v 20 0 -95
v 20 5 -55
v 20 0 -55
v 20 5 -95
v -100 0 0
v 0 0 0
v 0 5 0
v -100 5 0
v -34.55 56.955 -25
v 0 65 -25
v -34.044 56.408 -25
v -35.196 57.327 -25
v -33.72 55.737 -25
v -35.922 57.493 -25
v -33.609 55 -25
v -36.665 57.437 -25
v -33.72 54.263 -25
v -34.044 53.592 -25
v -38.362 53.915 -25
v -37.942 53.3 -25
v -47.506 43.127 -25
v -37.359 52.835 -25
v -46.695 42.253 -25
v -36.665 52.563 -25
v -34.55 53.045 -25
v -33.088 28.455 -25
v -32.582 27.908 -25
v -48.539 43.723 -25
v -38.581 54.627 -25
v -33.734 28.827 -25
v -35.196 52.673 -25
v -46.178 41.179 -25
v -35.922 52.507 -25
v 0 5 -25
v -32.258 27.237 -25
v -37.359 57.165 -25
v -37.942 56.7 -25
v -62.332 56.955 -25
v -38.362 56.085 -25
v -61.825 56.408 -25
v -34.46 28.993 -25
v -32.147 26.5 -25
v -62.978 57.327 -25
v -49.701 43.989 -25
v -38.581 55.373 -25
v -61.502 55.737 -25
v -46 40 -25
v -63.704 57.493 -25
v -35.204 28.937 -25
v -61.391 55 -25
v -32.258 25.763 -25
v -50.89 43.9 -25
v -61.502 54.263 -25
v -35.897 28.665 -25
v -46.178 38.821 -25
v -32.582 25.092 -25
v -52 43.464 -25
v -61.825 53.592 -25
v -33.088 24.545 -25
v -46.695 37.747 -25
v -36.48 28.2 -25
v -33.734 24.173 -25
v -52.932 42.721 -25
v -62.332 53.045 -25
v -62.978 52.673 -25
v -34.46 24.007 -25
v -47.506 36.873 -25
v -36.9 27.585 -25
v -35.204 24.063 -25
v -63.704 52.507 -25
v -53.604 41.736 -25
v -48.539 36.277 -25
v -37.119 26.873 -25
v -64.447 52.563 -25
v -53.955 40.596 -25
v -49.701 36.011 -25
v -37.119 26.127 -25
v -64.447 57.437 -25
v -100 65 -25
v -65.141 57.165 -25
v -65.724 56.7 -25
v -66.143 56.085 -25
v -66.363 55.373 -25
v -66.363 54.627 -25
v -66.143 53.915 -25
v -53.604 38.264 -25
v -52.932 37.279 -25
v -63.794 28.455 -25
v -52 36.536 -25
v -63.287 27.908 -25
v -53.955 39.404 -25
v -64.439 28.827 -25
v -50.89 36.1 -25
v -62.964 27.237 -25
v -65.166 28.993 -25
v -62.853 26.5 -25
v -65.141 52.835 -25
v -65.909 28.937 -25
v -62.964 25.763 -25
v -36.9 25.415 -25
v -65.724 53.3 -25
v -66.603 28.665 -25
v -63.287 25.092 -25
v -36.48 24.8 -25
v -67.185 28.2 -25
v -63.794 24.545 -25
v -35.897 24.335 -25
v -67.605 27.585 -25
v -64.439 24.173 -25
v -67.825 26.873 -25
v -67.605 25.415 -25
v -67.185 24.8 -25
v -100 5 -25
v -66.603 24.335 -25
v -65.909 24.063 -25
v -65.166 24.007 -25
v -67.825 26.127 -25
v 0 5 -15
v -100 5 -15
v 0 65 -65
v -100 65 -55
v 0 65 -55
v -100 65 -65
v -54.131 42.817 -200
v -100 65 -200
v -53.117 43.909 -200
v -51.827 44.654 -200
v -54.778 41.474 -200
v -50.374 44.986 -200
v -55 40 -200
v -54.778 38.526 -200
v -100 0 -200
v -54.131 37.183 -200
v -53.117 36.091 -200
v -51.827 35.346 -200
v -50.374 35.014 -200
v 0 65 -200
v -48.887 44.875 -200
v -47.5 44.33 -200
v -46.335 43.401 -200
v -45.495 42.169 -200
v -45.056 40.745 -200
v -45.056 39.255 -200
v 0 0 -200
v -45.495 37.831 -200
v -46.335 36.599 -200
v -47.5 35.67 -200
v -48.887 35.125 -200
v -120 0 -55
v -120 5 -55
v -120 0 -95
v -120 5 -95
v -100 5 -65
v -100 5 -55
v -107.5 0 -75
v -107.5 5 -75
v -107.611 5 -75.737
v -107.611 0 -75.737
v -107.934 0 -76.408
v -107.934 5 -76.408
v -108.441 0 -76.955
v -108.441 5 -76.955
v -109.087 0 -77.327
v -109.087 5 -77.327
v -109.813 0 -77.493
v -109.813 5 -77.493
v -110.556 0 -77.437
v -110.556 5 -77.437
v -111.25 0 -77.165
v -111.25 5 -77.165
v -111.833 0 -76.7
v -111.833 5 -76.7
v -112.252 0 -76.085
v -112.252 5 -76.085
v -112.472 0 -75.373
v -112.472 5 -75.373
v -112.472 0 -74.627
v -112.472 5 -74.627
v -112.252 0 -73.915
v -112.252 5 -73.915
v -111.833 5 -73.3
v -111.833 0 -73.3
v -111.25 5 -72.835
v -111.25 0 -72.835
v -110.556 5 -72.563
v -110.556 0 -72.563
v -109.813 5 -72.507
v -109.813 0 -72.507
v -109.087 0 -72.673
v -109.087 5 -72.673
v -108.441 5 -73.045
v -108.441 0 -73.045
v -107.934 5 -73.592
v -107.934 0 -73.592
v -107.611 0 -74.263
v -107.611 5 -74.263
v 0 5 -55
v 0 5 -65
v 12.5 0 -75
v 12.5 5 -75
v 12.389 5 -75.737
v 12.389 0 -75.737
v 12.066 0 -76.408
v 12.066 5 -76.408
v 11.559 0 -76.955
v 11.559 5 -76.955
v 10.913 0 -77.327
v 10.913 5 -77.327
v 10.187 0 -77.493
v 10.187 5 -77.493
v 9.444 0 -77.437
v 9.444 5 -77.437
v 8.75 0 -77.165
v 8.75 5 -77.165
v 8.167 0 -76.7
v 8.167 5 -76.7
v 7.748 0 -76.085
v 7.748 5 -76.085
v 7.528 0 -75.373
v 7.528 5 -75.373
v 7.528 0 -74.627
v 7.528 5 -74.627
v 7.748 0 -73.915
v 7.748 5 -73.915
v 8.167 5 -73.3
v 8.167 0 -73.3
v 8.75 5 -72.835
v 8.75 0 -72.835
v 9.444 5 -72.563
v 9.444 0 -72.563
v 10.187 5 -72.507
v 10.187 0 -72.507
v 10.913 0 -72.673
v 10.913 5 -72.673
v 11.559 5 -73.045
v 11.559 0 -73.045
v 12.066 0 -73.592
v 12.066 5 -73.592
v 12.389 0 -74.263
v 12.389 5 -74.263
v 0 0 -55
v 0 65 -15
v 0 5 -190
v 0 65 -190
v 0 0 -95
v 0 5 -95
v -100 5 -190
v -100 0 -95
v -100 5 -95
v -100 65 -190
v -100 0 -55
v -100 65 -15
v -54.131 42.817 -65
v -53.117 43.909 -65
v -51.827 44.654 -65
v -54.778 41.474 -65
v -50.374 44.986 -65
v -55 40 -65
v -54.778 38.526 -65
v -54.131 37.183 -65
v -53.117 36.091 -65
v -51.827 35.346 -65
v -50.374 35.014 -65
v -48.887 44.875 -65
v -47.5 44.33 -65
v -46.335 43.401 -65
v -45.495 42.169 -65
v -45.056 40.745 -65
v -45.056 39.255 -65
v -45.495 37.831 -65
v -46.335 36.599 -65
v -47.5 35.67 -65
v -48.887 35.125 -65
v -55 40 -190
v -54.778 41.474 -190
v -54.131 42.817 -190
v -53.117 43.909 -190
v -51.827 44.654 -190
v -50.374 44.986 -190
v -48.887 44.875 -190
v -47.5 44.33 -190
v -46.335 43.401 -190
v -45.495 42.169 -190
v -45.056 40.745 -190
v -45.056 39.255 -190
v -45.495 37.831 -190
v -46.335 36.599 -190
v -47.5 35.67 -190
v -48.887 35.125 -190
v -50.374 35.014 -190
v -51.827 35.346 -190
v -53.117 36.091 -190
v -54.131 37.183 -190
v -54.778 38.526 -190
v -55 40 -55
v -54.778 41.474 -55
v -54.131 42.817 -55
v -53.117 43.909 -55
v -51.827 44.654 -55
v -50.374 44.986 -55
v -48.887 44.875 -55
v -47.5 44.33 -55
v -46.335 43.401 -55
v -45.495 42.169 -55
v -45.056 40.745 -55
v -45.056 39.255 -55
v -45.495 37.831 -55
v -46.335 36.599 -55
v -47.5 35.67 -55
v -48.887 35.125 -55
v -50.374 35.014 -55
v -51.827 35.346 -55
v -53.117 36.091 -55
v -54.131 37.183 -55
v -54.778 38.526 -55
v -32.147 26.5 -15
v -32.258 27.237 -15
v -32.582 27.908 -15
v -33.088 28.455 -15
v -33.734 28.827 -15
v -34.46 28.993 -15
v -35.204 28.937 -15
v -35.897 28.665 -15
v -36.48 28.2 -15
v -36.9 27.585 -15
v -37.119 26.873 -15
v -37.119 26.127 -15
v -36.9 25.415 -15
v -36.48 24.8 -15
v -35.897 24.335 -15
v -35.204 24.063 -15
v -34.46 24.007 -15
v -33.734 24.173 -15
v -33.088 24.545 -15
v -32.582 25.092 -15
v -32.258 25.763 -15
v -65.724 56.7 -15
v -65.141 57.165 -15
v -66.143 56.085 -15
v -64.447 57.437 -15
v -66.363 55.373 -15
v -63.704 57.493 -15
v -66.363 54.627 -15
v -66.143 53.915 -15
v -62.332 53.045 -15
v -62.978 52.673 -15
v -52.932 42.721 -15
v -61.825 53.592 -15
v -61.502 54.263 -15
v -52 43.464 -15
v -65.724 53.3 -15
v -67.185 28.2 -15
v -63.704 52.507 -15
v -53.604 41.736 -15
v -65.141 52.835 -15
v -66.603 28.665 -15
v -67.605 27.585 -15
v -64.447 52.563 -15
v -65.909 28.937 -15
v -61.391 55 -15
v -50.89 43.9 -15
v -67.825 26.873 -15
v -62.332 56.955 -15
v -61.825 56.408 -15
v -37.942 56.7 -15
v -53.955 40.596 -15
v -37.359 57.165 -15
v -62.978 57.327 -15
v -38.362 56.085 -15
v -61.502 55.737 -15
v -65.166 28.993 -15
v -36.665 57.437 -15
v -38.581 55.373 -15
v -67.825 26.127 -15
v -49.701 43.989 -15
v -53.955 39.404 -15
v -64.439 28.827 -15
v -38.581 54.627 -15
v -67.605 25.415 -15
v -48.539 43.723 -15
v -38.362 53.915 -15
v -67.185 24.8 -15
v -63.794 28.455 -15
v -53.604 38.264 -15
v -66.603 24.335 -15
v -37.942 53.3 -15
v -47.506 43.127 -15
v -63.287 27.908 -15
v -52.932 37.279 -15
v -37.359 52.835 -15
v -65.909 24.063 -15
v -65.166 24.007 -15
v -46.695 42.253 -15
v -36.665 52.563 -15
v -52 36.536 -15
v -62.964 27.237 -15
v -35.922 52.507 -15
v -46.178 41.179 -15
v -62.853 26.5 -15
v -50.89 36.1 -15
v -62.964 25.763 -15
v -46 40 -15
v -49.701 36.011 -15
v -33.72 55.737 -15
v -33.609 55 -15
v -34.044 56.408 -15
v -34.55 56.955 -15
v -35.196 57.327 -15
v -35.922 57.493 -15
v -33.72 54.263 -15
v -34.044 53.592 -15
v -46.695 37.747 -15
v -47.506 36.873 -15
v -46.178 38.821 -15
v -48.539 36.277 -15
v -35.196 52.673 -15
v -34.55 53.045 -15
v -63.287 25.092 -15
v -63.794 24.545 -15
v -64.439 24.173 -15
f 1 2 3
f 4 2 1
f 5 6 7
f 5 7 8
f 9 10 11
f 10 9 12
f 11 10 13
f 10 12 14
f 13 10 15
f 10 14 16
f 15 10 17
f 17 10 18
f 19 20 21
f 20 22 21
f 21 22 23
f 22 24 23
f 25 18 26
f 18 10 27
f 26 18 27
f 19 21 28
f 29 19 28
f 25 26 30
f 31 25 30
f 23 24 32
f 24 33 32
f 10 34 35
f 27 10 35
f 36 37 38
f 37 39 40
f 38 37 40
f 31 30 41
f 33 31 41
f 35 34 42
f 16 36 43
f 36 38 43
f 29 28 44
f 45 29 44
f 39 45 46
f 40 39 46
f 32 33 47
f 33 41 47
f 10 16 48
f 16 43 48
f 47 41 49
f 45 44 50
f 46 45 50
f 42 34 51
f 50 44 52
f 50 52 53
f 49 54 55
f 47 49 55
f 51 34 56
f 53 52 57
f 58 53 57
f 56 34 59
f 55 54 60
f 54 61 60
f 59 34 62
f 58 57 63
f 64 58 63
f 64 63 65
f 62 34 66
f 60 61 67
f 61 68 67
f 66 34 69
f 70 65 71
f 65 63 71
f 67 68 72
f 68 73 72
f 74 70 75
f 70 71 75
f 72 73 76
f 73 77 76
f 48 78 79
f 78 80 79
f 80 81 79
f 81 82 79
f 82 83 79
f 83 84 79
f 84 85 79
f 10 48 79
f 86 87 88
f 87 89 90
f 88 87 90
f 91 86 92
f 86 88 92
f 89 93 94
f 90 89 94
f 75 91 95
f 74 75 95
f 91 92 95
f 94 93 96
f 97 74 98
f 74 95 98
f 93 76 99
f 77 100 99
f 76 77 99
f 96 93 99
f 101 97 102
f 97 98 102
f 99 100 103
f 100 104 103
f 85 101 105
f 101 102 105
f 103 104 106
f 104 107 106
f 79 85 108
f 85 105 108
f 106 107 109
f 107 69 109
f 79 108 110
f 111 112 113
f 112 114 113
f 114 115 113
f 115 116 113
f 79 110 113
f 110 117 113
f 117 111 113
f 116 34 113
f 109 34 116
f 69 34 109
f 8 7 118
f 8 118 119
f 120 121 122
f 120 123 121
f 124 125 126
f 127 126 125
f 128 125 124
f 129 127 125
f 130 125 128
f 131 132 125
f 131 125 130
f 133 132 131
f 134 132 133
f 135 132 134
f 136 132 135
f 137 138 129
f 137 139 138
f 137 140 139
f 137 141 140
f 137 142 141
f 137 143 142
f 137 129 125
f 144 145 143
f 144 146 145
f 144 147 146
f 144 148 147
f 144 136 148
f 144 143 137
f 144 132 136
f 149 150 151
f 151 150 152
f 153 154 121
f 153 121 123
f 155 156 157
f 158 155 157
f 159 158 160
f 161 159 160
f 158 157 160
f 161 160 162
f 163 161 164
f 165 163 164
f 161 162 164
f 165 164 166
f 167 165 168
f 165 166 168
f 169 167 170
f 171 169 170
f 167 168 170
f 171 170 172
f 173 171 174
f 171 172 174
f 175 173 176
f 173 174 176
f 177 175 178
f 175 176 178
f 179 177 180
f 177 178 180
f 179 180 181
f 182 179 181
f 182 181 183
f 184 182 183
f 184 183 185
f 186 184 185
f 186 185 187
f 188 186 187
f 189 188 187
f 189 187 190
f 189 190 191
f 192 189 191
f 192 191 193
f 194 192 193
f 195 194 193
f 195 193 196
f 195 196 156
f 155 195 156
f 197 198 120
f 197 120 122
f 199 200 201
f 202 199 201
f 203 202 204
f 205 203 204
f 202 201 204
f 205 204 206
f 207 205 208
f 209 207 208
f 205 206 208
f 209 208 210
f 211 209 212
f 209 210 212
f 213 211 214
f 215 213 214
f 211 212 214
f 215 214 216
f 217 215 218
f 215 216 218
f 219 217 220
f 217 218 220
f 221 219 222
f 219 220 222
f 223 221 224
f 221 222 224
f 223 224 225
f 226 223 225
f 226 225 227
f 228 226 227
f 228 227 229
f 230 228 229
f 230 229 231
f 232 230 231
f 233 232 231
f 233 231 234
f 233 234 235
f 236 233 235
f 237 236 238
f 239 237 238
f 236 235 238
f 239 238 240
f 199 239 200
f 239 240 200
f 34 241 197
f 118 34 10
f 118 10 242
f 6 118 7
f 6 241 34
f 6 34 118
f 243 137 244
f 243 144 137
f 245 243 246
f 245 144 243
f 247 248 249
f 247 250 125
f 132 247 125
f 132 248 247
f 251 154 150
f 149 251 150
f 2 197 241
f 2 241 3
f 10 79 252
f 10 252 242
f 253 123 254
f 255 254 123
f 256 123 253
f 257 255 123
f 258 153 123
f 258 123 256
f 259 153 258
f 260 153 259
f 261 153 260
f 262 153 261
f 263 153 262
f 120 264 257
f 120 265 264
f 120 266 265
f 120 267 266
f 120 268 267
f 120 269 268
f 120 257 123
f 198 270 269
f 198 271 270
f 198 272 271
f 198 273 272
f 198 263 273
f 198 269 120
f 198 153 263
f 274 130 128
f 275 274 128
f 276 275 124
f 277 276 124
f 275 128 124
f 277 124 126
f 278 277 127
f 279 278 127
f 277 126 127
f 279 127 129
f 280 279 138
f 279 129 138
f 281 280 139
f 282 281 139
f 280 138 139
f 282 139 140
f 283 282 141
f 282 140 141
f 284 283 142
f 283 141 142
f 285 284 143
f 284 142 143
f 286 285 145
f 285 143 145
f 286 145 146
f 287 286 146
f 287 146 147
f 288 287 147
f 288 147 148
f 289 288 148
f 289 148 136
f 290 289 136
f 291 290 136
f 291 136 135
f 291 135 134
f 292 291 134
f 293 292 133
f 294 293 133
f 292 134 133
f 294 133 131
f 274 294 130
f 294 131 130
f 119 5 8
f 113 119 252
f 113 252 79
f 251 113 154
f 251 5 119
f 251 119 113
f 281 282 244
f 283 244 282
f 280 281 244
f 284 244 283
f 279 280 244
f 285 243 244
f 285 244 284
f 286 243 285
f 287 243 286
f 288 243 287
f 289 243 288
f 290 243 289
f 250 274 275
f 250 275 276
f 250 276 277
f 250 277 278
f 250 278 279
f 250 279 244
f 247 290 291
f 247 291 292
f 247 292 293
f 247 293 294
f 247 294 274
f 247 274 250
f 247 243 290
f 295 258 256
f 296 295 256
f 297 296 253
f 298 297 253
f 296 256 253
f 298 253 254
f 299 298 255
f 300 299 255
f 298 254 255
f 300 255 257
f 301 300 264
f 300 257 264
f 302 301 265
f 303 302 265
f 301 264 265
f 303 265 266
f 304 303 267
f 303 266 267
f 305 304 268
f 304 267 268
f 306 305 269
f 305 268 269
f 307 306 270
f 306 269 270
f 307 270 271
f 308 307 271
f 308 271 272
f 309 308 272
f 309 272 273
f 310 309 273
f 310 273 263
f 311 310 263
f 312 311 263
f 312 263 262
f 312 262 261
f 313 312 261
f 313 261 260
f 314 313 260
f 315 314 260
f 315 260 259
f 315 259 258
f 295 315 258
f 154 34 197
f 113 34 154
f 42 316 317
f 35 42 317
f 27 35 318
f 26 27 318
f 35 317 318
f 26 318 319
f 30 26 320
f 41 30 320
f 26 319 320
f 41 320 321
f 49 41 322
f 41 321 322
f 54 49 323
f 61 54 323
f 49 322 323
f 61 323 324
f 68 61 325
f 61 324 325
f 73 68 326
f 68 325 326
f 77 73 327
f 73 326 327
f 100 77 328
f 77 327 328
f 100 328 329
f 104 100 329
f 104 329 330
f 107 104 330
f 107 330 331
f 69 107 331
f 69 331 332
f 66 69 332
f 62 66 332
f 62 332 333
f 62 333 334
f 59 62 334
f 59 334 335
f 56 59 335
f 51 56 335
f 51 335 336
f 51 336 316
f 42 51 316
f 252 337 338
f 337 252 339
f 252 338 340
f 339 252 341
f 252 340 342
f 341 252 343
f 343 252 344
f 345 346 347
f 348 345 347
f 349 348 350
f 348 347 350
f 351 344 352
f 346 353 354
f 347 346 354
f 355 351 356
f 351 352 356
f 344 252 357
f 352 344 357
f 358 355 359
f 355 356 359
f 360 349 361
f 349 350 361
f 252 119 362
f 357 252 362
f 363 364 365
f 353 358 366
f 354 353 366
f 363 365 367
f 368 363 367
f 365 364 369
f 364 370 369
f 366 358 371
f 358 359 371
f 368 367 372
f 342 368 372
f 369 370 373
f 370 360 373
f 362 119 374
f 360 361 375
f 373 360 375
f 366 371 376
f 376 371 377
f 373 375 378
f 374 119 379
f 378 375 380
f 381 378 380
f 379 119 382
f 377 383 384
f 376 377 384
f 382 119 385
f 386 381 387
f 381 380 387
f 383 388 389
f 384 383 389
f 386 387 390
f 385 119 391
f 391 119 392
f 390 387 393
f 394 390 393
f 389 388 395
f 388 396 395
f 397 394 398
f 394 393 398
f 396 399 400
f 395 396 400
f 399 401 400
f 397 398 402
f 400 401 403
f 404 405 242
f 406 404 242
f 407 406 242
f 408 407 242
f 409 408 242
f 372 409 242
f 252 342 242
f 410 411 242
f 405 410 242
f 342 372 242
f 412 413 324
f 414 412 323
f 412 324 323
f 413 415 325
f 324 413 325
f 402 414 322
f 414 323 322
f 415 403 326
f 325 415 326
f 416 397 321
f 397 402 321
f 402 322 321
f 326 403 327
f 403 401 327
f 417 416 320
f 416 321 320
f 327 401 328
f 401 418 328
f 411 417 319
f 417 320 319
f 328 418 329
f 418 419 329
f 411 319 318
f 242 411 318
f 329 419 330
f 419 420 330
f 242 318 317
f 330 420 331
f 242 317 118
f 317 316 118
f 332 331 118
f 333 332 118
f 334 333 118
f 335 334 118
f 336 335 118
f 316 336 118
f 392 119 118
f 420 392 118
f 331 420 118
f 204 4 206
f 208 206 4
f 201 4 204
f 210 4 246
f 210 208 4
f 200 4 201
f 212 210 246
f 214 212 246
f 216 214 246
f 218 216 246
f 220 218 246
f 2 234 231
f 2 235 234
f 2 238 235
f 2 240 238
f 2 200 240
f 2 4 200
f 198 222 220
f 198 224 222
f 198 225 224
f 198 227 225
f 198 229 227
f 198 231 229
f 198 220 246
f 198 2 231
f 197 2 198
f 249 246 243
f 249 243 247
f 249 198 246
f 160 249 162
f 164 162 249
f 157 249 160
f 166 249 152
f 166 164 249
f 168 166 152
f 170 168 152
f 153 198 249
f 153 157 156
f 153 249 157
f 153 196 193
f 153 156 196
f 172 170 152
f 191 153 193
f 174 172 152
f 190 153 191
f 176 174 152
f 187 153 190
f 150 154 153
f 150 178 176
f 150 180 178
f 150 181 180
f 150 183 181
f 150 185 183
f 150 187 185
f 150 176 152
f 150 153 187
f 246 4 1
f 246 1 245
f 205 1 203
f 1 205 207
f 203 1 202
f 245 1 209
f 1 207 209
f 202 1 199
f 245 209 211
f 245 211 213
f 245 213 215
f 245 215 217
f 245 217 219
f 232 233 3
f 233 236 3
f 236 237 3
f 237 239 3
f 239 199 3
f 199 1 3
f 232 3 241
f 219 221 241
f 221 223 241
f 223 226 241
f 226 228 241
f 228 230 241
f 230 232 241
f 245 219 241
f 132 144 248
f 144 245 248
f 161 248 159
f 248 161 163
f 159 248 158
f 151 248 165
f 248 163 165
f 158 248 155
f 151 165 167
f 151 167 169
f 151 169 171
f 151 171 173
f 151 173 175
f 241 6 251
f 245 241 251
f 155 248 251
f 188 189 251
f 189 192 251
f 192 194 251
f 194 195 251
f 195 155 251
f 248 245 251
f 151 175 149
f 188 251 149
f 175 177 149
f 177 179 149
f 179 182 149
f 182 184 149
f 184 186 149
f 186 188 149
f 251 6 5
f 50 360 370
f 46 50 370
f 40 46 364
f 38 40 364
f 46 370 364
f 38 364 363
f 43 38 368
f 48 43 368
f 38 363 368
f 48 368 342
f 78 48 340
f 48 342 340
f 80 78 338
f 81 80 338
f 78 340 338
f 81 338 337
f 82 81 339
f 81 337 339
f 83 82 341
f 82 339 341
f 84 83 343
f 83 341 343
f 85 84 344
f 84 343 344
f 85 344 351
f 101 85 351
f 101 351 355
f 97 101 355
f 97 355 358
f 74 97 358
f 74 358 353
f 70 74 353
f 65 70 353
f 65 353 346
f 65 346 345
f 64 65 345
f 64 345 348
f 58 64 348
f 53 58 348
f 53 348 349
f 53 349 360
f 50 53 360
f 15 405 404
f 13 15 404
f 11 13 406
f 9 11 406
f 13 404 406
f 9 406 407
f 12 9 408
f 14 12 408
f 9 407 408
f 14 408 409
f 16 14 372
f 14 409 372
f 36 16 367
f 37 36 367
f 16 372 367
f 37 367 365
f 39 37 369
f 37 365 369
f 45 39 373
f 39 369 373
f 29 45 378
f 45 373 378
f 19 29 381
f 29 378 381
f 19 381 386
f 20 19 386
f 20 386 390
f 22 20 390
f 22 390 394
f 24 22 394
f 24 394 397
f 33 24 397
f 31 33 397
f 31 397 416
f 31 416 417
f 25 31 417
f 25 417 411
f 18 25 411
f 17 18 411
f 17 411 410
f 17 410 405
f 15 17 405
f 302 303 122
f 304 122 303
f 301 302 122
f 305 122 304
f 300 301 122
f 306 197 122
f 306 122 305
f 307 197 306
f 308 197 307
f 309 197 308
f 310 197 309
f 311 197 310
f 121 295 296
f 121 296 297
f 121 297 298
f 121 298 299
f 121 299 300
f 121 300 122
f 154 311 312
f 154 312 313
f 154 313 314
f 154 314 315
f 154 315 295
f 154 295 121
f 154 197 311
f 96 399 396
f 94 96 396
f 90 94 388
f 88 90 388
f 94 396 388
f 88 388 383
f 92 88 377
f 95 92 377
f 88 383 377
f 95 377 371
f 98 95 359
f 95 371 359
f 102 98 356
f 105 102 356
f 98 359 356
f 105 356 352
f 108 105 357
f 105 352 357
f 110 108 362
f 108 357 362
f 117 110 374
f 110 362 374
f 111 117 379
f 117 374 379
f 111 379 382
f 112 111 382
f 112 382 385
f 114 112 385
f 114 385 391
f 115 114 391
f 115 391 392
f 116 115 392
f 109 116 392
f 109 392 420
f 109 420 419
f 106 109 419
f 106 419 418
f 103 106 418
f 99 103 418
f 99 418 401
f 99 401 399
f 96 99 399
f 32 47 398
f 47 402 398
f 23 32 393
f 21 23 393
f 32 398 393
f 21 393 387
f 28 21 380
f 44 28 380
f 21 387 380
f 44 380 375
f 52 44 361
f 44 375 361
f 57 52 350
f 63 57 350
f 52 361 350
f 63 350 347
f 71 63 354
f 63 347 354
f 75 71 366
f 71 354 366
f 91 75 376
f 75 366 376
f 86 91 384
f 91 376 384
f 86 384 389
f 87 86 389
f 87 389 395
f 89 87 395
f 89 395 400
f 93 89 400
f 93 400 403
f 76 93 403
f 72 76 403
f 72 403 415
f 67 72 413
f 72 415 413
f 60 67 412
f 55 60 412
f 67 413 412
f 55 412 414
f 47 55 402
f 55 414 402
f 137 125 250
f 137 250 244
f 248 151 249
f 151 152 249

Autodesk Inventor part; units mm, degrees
ref_plane "YZ Plane" through (0, 0, 0) normal (1, 0, 0) x (0, 1, 0)
ref_plane "XZ Plane" through (0, 0, 0) normal (0, 1, 0) x (-1, 0, 0)
ref_plane "XY Plane" through (0, 0, 0) normal (0, 0, 1) x (1, 0, 0)
sketch "Boceto2" plane through (0, 0, 0) normal (0, 1, 0) x (-1, 0, 0)
  line L0 (0, 0) -> (100, 0)
  line L1 (100, 0) -> (100, -200)
  line L2 (100, -200) -> (0, -200)
  line L3 (0, -200) -> (0, 0)
  dimension "d2" = 200
  dimension "d3" = 100
extrude "Extrusión1" add sketch "Boceto2" along normal blind 5
sketch "Boceto3" plane through (0, 5, 0) normal (0, 1, 0) x (1, 0, 0)
  line L0 (-100, 200) -> (-100, 0) projected
  line L1 (-100, 55) -> (-120, 55)
  line L2 (-120, 55) -> (-120, 95)
  line L3 (-120, 95) -> (-100, 95)
  line L4 (-100, 95) -> (-100, 55)
  line L5 (0, 0) -> (0, 200) projected
  line L6 (0, 55) -> (20, 55)
  line L7 (20, 55) -> (20, 95)
  line L8 (20, 95) -> (0, 95)
  line L9 (0, 95) -> (0, 55)
  line L10 (-100, 0) -> (0, 0) projected
  circle A0 centre (-110, 75) radius 2.5
  circle A1 centre (10, 75) radius 2.5
  point P0 (0, 95)
  dimension "d6" = 20
  dimension "d7" = 40
  dimension "d8" = 20
  dimension "d9" = 40
  dimension "d10" = 55
  dimension "d11" = 5
  dimension "d12" = 5
extrude "Extrusión2" add sketch "Boceto3" against normal blind 5
thread "Rosca1" size "M5x0.8" class "6H" standard "ANSI Metric M Profile" full length
thread "Rosca2" size "M5x0.8" class "6H" standard "ANSI Metric M Profile" full length
sketch "Boceto4" plane through (0, 5, 0) normal (0, 1, 0) x (1, 0, 0)
  line L0 (-100, 200) -> (-100, 95) projected
  line L1 (0, 95) -> (0, 200) projected
  line L2 (-100, 200) -> (0, 200)
  line L3 (0, 200) -> (0, 190)
  line L4 (0, 190) -> (-100, 190)
  line L5 (-100, 190) -> (-100, 200)
  line L6 (0, 55) -> (-100, 55)
  line L7 (-100, 55) -> (-100, 65)
  line L8 (-100, 65) -> (0, 65)
  line L9 (0, 65) -> (0, 55)
  line L10 (-100, 15) -> (0, 15)
  line L11 (0, 15) -> (0, 25)
  line L12 (0, 25) -> (-100, 25)
  line L13 (-100, 25) -> (-100, 15)
  line L14 (-100, 0) -> (0, 0) projected
  dimension "d19" = 10
  dimension "d20" = 100
  dimension "d21" = 10
  dimension "d22" = 100
  dimension "d24" = 30
  dimension "d56" = 125
extrude "Extrusión3" add sketch "Boceto4" along normal blind 60
sketch "Boceto5" plane through (0, 0, -200) normal (0, 0, -1) x (-1, 0, 0)
  circle A0 centre (50, 40) radius 5
  line L0 (0, 0) -> (0, 65) projected
  line L1 (0, 0) -> (100, 0) projected
  dimension "d28" = 10
  dimension "d29" = 50
  dimension "d34" = 40
extrude "Extrusión4" cut sketch "Boceto5" against normal blind 10
sketch "Boceto6" plane through (0, 5, -65) normal (0, 0, -1) x (-1, 0, 0)
  circle A0 centre (50, 35) radius 5 projected
  circle A1 centre (50, 35) radius 5
  point P0 (0, -5)
extrude "Extrusión5" cut sketch "Boceto6" against normal blind 10
sketch "Boceto7" plane through (-100, 5, -15) normal (0, 0, 1) x (1, 0, 0)
  circle A0 centre (50, 35) radius 5 projected
  circle A1 centre (50, 35) radius 4
  circle A2 centre (36.1091, 50) radius 2.5
  circle A3 centre (63.8909, 50) radius 2.5
  line L0 (0, 0) -> (0, 60) projected
  line L1 (100, 0) -> (100, 60) projected
  circle A4 centre (34.6472, 21.5) radius 2.5
  circle A5 centre (65.3528, 21.5) radius 2.5
  line L2 (0, 60) -> (100, 60) projected
  line L3 (0, 0) -> (100, 0) projected
  point P0 (100, -5)
  dimension "d35" = 8
  dimension "d36" = 5
  dimension "d37" = 5
  dimension "d41" = 5
  dimension "d42" = 5
  dimension "d45" = 10
  dimension "d47" = 10
  dimension "d50" = 20.444
  dimension "d51" = 28.5
  dimension "d52" = 20.444
  dimension "d53" = 20.444
  dimension "d54" = 20.444
  dimension "d55" = 28.5
extrude "Extrusión6" cut sketch "Boceto7" against normal blind 10 contours A1 | A2 | A3 | A4 | A5
properties part number "Base_motor"
